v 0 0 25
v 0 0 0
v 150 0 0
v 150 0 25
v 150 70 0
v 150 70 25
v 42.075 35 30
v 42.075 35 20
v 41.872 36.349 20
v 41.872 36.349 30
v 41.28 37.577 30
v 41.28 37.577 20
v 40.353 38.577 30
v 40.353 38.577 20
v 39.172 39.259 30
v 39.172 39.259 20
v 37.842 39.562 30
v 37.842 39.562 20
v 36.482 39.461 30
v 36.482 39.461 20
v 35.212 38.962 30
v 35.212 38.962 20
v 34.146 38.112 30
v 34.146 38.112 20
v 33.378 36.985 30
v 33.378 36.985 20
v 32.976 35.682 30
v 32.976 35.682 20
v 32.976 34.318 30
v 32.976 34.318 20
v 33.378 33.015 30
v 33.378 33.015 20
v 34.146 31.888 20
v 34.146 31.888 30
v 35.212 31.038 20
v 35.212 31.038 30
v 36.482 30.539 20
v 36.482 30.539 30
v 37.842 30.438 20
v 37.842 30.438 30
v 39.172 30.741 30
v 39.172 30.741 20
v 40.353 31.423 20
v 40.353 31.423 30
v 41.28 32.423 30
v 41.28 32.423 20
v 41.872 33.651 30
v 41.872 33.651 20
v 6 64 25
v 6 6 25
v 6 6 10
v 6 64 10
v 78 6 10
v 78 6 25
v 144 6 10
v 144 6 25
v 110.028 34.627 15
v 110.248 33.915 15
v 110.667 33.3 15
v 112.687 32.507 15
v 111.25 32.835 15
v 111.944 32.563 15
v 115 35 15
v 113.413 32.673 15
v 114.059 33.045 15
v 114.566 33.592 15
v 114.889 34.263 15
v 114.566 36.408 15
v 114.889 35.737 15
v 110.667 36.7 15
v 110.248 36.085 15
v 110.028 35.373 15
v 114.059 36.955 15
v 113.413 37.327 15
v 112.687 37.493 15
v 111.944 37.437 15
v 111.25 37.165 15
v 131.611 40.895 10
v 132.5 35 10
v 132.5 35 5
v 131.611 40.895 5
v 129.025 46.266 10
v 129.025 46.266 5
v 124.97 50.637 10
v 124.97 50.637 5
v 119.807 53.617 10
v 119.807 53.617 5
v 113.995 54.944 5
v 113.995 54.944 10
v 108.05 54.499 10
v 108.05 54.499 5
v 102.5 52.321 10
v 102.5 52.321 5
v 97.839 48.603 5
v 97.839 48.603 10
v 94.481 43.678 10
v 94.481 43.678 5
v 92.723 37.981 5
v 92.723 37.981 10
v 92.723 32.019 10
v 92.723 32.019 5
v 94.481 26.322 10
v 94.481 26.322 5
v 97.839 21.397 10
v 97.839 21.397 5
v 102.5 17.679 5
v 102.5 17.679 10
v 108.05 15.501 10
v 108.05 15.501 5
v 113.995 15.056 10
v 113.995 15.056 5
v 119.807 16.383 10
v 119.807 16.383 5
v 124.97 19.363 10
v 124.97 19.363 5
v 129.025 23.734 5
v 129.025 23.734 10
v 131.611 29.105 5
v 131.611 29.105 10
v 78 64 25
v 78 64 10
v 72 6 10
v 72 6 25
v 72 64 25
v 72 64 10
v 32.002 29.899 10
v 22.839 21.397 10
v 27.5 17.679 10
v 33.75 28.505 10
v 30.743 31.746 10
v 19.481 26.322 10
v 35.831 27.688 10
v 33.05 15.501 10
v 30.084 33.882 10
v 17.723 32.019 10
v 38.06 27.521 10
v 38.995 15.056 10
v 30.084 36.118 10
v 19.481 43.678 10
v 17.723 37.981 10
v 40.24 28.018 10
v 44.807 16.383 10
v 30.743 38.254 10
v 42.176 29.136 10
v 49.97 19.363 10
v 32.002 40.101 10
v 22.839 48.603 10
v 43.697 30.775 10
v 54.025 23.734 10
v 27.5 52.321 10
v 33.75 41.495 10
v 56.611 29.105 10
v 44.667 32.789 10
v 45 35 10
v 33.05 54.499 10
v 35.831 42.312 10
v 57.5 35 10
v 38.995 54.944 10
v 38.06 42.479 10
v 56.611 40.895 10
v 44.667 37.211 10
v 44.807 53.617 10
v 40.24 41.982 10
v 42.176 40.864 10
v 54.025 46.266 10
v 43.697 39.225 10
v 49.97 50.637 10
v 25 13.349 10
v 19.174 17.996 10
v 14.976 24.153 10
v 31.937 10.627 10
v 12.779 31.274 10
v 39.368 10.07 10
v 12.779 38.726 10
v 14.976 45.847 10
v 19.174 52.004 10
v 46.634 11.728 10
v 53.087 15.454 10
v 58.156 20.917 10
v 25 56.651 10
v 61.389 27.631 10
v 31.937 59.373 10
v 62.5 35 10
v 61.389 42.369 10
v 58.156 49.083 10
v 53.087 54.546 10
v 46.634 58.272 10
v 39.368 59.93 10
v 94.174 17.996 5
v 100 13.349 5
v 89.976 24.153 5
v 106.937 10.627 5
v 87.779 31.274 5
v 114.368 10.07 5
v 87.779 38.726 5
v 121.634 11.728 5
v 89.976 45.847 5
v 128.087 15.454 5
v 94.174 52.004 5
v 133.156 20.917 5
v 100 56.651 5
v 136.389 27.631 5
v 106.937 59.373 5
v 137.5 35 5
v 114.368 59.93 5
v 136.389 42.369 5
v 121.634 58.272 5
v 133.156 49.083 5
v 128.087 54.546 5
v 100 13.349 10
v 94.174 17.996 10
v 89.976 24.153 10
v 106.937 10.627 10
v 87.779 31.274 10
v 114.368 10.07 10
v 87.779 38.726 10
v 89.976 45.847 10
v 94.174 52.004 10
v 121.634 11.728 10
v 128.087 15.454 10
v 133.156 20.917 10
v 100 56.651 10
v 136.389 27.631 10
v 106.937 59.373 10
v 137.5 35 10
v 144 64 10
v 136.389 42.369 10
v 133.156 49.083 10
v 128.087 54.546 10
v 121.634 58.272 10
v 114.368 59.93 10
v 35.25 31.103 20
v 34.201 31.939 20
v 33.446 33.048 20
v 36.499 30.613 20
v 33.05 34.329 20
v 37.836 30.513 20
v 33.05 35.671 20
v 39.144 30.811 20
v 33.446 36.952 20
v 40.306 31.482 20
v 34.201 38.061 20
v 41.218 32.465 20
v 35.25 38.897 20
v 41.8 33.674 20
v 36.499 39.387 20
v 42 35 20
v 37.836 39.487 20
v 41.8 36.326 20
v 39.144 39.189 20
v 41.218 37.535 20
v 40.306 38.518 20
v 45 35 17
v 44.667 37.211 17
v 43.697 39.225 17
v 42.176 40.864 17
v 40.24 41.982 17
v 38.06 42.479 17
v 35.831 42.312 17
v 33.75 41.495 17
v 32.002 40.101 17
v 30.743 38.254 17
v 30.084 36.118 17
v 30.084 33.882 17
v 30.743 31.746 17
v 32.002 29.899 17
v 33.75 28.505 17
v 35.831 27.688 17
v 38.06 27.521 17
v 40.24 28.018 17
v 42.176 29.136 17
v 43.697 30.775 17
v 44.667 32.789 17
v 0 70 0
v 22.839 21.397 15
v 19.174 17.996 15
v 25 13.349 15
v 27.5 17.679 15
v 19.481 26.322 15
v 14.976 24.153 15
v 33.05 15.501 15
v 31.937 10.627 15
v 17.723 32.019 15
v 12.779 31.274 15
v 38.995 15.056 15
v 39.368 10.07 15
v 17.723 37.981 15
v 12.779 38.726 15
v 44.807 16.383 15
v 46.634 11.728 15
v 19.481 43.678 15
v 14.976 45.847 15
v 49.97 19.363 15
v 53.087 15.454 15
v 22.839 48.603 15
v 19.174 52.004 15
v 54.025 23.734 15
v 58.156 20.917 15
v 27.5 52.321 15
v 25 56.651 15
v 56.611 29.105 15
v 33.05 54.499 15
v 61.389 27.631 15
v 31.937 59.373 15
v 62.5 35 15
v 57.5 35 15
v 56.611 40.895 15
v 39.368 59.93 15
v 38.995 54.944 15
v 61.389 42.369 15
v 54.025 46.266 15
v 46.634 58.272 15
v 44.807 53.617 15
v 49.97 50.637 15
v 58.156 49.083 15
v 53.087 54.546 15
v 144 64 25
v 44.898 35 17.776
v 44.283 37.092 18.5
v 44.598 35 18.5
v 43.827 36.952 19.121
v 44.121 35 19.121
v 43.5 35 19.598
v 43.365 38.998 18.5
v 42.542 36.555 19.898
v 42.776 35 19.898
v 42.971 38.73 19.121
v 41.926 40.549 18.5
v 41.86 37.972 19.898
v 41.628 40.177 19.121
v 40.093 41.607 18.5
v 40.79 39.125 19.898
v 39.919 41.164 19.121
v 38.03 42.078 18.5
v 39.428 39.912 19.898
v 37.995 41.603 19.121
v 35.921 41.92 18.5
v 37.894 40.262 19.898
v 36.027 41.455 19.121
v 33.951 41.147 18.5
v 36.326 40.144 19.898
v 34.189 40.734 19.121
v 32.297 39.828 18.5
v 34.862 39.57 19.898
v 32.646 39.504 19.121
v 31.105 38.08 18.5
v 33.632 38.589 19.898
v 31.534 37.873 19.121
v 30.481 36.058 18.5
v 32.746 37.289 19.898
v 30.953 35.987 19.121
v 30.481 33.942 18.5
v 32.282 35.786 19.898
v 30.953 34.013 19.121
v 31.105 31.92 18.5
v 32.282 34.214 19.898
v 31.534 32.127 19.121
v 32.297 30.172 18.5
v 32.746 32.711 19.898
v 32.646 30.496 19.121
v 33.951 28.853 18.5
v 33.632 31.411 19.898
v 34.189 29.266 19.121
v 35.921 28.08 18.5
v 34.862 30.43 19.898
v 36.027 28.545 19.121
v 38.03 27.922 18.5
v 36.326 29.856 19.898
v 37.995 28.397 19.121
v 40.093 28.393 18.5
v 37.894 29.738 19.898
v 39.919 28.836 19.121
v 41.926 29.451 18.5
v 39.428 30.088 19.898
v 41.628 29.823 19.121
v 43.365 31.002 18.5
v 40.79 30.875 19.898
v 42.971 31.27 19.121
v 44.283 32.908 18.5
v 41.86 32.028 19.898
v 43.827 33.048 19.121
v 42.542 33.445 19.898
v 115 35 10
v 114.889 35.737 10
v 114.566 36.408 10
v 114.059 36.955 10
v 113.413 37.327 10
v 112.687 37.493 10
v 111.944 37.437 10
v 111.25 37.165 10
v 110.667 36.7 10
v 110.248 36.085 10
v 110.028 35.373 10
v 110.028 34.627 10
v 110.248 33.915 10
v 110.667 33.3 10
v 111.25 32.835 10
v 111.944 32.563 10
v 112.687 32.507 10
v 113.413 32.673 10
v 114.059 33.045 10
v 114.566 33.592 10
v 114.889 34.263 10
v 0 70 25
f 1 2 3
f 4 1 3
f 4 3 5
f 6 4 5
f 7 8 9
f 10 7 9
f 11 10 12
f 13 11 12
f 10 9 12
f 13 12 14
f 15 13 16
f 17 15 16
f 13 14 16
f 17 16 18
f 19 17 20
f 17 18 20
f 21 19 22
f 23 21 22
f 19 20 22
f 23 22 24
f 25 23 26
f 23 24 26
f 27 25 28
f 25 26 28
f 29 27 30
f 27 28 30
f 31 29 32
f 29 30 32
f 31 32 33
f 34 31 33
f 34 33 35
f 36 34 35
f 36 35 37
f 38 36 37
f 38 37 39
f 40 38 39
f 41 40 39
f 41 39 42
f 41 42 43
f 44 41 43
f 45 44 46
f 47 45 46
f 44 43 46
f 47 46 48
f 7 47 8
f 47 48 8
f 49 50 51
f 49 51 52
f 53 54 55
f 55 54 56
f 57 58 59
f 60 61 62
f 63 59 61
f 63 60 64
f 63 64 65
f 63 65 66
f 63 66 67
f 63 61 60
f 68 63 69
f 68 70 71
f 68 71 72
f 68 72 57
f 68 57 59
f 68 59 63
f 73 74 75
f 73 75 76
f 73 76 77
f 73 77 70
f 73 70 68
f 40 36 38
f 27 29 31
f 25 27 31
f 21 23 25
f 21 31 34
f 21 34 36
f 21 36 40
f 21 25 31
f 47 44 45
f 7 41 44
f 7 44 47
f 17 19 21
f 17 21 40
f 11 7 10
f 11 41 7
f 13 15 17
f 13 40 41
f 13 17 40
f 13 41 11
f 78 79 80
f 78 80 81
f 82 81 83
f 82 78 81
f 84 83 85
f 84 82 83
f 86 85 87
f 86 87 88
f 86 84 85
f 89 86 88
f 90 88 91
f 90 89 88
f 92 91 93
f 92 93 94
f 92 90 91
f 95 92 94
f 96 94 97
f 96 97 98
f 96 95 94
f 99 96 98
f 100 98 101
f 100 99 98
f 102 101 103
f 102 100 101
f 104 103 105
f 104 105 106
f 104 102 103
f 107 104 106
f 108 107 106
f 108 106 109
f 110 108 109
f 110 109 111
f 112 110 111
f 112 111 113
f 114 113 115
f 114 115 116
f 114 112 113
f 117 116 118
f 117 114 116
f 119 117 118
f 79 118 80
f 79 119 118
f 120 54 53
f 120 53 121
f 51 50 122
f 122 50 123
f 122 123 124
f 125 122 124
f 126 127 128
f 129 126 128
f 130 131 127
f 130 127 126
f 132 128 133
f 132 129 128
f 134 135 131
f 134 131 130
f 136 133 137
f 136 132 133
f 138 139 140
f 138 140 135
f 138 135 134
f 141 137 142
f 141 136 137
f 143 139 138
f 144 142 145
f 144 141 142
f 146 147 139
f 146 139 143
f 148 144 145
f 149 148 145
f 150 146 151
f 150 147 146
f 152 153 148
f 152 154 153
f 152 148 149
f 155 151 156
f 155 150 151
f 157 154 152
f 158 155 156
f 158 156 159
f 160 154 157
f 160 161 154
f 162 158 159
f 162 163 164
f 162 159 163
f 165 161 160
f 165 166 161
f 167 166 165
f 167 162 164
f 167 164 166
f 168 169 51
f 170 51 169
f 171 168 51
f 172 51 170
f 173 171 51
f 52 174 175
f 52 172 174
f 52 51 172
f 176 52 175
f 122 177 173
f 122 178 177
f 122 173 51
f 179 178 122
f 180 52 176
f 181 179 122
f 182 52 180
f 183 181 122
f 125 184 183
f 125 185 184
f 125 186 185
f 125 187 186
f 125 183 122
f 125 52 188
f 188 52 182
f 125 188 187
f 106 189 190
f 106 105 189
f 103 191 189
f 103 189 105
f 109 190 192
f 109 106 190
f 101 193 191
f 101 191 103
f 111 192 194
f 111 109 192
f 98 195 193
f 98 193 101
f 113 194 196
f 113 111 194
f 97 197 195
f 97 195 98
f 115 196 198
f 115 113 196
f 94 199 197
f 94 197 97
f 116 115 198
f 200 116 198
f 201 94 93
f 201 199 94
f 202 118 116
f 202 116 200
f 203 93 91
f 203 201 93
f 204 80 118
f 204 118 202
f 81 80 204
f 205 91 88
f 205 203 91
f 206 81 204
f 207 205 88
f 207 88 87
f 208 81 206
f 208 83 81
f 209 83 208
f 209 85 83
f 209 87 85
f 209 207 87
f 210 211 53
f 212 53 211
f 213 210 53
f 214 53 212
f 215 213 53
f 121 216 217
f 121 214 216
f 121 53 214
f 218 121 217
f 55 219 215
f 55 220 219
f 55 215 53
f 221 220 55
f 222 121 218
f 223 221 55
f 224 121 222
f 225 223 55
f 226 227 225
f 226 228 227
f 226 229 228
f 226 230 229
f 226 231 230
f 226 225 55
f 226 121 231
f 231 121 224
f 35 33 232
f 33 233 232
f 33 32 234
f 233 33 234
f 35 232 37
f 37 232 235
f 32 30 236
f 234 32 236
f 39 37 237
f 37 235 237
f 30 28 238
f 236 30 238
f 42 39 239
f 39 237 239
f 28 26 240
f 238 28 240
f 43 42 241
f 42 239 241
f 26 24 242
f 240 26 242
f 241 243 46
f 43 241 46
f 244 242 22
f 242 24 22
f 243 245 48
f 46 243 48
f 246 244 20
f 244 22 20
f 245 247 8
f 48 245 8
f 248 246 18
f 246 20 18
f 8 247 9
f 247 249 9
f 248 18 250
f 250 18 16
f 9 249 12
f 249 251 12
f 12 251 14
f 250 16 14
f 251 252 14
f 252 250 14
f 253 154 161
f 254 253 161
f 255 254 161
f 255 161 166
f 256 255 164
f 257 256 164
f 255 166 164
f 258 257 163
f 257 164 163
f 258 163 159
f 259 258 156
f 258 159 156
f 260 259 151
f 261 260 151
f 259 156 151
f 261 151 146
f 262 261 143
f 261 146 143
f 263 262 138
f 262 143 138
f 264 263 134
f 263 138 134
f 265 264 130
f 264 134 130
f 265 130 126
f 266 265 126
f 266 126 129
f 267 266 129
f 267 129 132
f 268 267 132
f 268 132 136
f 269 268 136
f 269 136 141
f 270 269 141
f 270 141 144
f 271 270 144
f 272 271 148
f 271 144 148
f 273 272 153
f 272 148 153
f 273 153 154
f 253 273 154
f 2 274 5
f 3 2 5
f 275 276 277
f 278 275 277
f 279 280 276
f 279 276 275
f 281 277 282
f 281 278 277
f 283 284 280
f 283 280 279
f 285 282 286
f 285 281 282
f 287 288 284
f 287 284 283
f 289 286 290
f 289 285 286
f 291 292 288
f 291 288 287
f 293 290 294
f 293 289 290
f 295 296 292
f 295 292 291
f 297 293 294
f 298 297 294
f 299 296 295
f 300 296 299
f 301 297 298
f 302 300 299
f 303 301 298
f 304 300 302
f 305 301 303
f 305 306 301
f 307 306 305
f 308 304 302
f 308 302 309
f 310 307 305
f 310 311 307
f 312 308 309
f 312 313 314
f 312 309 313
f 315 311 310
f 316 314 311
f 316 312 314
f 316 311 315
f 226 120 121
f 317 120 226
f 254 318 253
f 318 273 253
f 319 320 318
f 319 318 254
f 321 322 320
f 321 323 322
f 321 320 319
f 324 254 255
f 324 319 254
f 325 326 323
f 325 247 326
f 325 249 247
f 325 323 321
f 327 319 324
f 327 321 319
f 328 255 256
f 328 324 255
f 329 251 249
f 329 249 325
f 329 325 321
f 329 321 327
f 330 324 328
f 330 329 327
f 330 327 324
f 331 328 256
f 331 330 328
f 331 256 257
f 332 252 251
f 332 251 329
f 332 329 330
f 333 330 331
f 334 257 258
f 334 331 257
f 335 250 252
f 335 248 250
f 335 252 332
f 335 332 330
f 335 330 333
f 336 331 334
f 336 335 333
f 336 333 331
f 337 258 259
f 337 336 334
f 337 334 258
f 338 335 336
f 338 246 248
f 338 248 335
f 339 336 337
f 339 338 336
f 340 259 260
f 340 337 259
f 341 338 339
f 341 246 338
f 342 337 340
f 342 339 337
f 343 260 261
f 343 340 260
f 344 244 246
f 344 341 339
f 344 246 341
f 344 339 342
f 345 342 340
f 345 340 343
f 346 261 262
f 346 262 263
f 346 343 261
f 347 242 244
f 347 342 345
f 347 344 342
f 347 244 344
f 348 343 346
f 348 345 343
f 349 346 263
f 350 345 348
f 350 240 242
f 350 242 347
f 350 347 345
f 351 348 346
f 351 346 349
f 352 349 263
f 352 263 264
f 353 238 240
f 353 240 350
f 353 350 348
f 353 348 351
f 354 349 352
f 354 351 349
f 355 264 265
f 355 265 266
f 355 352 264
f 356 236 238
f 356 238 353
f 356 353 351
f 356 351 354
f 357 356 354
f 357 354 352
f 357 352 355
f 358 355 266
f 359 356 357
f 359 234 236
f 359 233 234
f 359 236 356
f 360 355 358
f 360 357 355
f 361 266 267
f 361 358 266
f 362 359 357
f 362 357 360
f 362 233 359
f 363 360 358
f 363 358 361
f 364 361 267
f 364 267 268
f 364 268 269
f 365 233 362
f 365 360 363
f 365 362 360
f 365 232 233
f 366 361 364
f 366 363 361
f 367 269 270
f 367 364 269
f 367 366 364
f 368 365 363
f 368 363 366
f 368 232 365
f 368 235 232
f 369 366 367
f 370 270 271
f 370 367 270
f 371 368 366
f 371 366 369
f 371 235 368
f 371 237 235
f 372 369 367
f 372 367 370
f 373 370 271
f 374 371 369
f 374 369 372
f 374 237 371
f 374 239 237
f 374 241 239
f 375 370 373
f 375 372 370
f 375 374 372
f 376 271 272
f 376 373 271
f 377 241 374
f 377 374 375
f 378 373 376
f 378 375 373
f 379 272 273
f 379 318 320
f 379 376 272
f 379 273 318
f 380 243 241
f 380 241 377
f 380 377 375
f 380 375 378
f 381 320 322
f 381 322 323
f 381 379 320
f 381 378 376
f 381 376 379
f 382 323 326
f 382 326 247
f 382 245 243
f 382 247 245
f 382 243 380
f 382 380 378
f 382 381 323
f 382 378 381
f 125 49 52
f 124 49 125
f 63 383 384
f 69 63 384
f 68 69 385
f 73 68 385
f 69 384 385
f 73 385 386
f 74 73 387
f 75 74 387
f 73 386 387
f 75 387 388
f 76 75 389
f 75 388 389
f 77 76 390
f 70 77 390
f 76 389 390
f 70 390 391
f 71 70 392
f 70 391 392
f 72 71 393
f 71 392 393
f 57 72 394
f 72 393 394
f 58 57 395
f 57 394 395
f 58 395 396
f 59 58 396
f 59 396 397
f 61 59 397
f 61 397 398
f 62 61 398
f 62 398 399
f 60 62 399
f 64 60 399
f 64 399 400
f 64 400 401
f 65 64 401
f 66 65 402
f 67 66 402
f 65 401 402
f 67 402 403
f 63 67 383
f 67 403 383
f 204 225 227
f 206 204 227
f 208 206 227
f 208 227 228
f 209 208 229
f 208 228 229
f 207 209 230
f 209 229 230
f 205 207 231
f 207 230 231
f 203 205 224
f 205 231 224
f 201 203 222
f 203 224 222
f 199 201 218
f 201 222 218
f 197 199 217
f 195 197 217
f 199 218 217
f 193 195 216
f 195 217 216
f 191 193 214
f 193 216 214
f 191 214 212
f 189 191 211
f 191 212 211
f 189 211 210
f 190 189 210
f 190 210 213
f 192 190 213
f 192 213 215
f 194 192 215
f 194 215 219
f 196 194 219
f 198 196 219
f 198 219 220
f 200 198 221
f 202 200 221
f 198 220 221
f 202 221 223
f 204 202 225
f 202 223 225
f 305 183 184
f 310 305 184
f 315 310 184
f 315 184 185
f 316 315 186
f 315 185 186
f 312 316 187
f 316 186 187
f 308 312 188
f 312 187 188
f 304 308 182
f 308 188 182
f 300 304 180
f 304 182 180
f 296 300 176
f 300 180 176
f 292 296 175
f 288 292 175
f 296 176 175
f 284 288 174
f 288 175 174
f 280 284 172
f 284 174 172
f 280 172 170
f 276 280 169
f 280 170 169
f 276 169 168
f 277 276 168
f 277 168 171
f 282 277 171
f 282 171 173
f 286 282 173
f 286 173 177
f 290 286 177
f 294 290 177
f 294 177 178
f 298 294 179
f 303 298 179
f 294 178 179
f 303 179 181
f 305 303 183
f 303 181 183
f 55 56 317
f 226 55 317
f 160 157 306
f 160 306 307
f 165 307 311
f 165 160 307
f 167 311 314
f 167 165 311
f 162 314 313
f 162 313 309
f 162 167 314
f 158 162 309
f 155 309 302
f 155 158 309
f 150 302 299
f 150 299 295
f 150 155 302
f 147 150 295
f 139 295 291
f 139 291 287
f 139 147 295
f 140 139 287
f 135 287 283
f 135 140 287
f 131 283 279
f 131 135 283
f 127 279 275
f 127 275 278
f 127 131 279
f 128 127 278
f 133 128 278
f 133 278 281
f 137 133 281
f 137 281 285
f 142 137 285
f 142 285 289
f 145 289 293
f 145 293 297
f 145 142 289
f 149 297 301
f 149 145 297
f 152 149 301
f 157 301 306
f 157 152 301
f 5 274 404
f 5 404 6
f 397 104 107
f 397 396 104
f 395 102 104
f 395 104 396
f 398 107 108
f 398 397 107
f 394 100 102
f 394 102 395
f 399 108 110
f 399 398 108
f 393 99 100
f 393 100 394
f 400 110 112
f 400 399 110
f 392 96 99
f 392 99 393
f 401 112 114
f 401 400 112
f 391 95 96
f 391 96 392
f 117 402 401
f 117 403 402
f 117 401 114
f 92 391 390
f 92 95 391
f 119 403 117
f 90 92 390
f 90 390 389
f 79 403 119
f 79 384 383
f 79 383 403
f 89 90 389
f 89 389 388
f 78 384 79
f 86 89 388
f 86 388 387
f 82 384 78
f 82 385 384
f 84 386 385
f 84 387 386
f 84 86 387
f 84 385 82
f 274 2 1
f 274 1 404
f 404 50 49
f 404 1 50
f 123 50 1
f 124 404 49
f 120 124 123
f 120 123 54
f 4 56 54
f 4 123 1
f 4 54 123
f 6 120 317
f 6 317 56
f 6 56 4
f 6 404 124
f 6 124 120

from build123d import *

# Parameters (mm, degrees)
ESQUISSE1_W             = 150
ESQUISSE1_H             = 70
BOSS_EXTRU_1_DEPTH      = 25
ESQUISSE2_W             = 66
ESQUISSE2_H             = 58
ENL_V_MAT_EXTRU_1_DEPTH = 15
ESQUISSE3_R             = 25
ESQUISSE3_R_2           = 20
BOSS_EXTRU_2_DEPTH      = 5
ESQUISSE4_R             = 25
ESQUISSE4_R_2           = 20
ENL_V_MAT_EXTRU_2_DEPTH = 5
ESQUISSE5_R             = 7.5
BOSS_EXTRU_3_DEPTH      = 10
CONG_2_R                = 3
ESQUISSE6_R             = 2.5
BOSS_EXTRU_4_DEPTH      = 5
ESQUISSE7_R             = 4.575268676
BOSS_EXTRU_5_DEPTH      = 10


with BuildPart() as part:
    # Esquisse1 → Boss.-Extru.1 (new body)
    with BuildSketch(Plane.XY):
        with Locations((75, 35)):
            Rectangle(ESQUISSE1_W, ESQUISSE1_H)
    extrude(amount=BOSS_EXTRU_1_DEPTH)

    # Esquisse2 → Enlèv. mat.-Extru.1 (cut)
    with BuildSketch(Plane.XY.offset(25)):
        with Locations((39, 35)):
            Rectangle(ESQUISSE2_W, ESQUISSE2_H)
        with Locations((111, 35)):
            Rectangle(ESQUISSE2_W, ESQUISSE2_H)
    extrude(amount=-ENL_V_MAT_EXTRU_1_DEPTH, mode=Mode.SUBTRACT)

    # Esquisse3 → Boss.-Extru.2 (add)
    with BuildSketch(Plane.XY.offset(10)):
        with Locations((37.5, 35)):
            Circle(ESQUISSE3_R)
        with Locations((37.5, 35)):
            Circle(ESQUISSE3_R_2, mode=Mode.SUBTRACT)
    extrude(amount=BOSS_EXTRU_2_DEPTH)

    # Esquisse4 → Enlèv. mat.-Extru.2 (cut)
    with BuildSketch(Plane.XY.offset(10)):
        with Locations((112.5, 35)):
            Circle(ESQUISSE4_R)
        with Locations((112.5, 35)):
            Circle(ESQUISSE4_R_2, mode=Mode.SUBTRACT)
    extrude(amount=-ENL_V_MAT_EXTRU_2_DEPTH, mode=Mode.SUBTRACT)

    # Esquisse5 → Boss.-Extru.3 (add)
    with BuildSketch(Plane.XY.offset(10)):
        with Locations((37.5, 35)):
            Circle(ESQUISSE5_R)
    extrude(amount=BOSS_EXTRU_3_DEPTH)

    # Congé2
    cong_2_edges = [part.edges().sort_by_distance(p)[0] for p in [
        (30, 35, 20),
    ]]
    fillet(cong_2_edges, radius=CONG_2_R)

    # Esquisse6 → Boss.-Extru.4 (add)
    with BuildSketch(Plane.XY.offset(10)):
        with Locations((112.5, 35)):
            Circle(ESQUISSE6_R)
    extrude(amount=BOSS_EXTRU_4_DEPTH)

    # Esquisse7 → Boss.-Extru.5 (add)
    with BuildSketch(Plane.XY.offset(20)):
        with Locations((37.5, 35)):
            Circle(ESQUISSE7_R)
    extrude(amount=BOSS_EXTRU_5_DEPTH)


solid = part.part
